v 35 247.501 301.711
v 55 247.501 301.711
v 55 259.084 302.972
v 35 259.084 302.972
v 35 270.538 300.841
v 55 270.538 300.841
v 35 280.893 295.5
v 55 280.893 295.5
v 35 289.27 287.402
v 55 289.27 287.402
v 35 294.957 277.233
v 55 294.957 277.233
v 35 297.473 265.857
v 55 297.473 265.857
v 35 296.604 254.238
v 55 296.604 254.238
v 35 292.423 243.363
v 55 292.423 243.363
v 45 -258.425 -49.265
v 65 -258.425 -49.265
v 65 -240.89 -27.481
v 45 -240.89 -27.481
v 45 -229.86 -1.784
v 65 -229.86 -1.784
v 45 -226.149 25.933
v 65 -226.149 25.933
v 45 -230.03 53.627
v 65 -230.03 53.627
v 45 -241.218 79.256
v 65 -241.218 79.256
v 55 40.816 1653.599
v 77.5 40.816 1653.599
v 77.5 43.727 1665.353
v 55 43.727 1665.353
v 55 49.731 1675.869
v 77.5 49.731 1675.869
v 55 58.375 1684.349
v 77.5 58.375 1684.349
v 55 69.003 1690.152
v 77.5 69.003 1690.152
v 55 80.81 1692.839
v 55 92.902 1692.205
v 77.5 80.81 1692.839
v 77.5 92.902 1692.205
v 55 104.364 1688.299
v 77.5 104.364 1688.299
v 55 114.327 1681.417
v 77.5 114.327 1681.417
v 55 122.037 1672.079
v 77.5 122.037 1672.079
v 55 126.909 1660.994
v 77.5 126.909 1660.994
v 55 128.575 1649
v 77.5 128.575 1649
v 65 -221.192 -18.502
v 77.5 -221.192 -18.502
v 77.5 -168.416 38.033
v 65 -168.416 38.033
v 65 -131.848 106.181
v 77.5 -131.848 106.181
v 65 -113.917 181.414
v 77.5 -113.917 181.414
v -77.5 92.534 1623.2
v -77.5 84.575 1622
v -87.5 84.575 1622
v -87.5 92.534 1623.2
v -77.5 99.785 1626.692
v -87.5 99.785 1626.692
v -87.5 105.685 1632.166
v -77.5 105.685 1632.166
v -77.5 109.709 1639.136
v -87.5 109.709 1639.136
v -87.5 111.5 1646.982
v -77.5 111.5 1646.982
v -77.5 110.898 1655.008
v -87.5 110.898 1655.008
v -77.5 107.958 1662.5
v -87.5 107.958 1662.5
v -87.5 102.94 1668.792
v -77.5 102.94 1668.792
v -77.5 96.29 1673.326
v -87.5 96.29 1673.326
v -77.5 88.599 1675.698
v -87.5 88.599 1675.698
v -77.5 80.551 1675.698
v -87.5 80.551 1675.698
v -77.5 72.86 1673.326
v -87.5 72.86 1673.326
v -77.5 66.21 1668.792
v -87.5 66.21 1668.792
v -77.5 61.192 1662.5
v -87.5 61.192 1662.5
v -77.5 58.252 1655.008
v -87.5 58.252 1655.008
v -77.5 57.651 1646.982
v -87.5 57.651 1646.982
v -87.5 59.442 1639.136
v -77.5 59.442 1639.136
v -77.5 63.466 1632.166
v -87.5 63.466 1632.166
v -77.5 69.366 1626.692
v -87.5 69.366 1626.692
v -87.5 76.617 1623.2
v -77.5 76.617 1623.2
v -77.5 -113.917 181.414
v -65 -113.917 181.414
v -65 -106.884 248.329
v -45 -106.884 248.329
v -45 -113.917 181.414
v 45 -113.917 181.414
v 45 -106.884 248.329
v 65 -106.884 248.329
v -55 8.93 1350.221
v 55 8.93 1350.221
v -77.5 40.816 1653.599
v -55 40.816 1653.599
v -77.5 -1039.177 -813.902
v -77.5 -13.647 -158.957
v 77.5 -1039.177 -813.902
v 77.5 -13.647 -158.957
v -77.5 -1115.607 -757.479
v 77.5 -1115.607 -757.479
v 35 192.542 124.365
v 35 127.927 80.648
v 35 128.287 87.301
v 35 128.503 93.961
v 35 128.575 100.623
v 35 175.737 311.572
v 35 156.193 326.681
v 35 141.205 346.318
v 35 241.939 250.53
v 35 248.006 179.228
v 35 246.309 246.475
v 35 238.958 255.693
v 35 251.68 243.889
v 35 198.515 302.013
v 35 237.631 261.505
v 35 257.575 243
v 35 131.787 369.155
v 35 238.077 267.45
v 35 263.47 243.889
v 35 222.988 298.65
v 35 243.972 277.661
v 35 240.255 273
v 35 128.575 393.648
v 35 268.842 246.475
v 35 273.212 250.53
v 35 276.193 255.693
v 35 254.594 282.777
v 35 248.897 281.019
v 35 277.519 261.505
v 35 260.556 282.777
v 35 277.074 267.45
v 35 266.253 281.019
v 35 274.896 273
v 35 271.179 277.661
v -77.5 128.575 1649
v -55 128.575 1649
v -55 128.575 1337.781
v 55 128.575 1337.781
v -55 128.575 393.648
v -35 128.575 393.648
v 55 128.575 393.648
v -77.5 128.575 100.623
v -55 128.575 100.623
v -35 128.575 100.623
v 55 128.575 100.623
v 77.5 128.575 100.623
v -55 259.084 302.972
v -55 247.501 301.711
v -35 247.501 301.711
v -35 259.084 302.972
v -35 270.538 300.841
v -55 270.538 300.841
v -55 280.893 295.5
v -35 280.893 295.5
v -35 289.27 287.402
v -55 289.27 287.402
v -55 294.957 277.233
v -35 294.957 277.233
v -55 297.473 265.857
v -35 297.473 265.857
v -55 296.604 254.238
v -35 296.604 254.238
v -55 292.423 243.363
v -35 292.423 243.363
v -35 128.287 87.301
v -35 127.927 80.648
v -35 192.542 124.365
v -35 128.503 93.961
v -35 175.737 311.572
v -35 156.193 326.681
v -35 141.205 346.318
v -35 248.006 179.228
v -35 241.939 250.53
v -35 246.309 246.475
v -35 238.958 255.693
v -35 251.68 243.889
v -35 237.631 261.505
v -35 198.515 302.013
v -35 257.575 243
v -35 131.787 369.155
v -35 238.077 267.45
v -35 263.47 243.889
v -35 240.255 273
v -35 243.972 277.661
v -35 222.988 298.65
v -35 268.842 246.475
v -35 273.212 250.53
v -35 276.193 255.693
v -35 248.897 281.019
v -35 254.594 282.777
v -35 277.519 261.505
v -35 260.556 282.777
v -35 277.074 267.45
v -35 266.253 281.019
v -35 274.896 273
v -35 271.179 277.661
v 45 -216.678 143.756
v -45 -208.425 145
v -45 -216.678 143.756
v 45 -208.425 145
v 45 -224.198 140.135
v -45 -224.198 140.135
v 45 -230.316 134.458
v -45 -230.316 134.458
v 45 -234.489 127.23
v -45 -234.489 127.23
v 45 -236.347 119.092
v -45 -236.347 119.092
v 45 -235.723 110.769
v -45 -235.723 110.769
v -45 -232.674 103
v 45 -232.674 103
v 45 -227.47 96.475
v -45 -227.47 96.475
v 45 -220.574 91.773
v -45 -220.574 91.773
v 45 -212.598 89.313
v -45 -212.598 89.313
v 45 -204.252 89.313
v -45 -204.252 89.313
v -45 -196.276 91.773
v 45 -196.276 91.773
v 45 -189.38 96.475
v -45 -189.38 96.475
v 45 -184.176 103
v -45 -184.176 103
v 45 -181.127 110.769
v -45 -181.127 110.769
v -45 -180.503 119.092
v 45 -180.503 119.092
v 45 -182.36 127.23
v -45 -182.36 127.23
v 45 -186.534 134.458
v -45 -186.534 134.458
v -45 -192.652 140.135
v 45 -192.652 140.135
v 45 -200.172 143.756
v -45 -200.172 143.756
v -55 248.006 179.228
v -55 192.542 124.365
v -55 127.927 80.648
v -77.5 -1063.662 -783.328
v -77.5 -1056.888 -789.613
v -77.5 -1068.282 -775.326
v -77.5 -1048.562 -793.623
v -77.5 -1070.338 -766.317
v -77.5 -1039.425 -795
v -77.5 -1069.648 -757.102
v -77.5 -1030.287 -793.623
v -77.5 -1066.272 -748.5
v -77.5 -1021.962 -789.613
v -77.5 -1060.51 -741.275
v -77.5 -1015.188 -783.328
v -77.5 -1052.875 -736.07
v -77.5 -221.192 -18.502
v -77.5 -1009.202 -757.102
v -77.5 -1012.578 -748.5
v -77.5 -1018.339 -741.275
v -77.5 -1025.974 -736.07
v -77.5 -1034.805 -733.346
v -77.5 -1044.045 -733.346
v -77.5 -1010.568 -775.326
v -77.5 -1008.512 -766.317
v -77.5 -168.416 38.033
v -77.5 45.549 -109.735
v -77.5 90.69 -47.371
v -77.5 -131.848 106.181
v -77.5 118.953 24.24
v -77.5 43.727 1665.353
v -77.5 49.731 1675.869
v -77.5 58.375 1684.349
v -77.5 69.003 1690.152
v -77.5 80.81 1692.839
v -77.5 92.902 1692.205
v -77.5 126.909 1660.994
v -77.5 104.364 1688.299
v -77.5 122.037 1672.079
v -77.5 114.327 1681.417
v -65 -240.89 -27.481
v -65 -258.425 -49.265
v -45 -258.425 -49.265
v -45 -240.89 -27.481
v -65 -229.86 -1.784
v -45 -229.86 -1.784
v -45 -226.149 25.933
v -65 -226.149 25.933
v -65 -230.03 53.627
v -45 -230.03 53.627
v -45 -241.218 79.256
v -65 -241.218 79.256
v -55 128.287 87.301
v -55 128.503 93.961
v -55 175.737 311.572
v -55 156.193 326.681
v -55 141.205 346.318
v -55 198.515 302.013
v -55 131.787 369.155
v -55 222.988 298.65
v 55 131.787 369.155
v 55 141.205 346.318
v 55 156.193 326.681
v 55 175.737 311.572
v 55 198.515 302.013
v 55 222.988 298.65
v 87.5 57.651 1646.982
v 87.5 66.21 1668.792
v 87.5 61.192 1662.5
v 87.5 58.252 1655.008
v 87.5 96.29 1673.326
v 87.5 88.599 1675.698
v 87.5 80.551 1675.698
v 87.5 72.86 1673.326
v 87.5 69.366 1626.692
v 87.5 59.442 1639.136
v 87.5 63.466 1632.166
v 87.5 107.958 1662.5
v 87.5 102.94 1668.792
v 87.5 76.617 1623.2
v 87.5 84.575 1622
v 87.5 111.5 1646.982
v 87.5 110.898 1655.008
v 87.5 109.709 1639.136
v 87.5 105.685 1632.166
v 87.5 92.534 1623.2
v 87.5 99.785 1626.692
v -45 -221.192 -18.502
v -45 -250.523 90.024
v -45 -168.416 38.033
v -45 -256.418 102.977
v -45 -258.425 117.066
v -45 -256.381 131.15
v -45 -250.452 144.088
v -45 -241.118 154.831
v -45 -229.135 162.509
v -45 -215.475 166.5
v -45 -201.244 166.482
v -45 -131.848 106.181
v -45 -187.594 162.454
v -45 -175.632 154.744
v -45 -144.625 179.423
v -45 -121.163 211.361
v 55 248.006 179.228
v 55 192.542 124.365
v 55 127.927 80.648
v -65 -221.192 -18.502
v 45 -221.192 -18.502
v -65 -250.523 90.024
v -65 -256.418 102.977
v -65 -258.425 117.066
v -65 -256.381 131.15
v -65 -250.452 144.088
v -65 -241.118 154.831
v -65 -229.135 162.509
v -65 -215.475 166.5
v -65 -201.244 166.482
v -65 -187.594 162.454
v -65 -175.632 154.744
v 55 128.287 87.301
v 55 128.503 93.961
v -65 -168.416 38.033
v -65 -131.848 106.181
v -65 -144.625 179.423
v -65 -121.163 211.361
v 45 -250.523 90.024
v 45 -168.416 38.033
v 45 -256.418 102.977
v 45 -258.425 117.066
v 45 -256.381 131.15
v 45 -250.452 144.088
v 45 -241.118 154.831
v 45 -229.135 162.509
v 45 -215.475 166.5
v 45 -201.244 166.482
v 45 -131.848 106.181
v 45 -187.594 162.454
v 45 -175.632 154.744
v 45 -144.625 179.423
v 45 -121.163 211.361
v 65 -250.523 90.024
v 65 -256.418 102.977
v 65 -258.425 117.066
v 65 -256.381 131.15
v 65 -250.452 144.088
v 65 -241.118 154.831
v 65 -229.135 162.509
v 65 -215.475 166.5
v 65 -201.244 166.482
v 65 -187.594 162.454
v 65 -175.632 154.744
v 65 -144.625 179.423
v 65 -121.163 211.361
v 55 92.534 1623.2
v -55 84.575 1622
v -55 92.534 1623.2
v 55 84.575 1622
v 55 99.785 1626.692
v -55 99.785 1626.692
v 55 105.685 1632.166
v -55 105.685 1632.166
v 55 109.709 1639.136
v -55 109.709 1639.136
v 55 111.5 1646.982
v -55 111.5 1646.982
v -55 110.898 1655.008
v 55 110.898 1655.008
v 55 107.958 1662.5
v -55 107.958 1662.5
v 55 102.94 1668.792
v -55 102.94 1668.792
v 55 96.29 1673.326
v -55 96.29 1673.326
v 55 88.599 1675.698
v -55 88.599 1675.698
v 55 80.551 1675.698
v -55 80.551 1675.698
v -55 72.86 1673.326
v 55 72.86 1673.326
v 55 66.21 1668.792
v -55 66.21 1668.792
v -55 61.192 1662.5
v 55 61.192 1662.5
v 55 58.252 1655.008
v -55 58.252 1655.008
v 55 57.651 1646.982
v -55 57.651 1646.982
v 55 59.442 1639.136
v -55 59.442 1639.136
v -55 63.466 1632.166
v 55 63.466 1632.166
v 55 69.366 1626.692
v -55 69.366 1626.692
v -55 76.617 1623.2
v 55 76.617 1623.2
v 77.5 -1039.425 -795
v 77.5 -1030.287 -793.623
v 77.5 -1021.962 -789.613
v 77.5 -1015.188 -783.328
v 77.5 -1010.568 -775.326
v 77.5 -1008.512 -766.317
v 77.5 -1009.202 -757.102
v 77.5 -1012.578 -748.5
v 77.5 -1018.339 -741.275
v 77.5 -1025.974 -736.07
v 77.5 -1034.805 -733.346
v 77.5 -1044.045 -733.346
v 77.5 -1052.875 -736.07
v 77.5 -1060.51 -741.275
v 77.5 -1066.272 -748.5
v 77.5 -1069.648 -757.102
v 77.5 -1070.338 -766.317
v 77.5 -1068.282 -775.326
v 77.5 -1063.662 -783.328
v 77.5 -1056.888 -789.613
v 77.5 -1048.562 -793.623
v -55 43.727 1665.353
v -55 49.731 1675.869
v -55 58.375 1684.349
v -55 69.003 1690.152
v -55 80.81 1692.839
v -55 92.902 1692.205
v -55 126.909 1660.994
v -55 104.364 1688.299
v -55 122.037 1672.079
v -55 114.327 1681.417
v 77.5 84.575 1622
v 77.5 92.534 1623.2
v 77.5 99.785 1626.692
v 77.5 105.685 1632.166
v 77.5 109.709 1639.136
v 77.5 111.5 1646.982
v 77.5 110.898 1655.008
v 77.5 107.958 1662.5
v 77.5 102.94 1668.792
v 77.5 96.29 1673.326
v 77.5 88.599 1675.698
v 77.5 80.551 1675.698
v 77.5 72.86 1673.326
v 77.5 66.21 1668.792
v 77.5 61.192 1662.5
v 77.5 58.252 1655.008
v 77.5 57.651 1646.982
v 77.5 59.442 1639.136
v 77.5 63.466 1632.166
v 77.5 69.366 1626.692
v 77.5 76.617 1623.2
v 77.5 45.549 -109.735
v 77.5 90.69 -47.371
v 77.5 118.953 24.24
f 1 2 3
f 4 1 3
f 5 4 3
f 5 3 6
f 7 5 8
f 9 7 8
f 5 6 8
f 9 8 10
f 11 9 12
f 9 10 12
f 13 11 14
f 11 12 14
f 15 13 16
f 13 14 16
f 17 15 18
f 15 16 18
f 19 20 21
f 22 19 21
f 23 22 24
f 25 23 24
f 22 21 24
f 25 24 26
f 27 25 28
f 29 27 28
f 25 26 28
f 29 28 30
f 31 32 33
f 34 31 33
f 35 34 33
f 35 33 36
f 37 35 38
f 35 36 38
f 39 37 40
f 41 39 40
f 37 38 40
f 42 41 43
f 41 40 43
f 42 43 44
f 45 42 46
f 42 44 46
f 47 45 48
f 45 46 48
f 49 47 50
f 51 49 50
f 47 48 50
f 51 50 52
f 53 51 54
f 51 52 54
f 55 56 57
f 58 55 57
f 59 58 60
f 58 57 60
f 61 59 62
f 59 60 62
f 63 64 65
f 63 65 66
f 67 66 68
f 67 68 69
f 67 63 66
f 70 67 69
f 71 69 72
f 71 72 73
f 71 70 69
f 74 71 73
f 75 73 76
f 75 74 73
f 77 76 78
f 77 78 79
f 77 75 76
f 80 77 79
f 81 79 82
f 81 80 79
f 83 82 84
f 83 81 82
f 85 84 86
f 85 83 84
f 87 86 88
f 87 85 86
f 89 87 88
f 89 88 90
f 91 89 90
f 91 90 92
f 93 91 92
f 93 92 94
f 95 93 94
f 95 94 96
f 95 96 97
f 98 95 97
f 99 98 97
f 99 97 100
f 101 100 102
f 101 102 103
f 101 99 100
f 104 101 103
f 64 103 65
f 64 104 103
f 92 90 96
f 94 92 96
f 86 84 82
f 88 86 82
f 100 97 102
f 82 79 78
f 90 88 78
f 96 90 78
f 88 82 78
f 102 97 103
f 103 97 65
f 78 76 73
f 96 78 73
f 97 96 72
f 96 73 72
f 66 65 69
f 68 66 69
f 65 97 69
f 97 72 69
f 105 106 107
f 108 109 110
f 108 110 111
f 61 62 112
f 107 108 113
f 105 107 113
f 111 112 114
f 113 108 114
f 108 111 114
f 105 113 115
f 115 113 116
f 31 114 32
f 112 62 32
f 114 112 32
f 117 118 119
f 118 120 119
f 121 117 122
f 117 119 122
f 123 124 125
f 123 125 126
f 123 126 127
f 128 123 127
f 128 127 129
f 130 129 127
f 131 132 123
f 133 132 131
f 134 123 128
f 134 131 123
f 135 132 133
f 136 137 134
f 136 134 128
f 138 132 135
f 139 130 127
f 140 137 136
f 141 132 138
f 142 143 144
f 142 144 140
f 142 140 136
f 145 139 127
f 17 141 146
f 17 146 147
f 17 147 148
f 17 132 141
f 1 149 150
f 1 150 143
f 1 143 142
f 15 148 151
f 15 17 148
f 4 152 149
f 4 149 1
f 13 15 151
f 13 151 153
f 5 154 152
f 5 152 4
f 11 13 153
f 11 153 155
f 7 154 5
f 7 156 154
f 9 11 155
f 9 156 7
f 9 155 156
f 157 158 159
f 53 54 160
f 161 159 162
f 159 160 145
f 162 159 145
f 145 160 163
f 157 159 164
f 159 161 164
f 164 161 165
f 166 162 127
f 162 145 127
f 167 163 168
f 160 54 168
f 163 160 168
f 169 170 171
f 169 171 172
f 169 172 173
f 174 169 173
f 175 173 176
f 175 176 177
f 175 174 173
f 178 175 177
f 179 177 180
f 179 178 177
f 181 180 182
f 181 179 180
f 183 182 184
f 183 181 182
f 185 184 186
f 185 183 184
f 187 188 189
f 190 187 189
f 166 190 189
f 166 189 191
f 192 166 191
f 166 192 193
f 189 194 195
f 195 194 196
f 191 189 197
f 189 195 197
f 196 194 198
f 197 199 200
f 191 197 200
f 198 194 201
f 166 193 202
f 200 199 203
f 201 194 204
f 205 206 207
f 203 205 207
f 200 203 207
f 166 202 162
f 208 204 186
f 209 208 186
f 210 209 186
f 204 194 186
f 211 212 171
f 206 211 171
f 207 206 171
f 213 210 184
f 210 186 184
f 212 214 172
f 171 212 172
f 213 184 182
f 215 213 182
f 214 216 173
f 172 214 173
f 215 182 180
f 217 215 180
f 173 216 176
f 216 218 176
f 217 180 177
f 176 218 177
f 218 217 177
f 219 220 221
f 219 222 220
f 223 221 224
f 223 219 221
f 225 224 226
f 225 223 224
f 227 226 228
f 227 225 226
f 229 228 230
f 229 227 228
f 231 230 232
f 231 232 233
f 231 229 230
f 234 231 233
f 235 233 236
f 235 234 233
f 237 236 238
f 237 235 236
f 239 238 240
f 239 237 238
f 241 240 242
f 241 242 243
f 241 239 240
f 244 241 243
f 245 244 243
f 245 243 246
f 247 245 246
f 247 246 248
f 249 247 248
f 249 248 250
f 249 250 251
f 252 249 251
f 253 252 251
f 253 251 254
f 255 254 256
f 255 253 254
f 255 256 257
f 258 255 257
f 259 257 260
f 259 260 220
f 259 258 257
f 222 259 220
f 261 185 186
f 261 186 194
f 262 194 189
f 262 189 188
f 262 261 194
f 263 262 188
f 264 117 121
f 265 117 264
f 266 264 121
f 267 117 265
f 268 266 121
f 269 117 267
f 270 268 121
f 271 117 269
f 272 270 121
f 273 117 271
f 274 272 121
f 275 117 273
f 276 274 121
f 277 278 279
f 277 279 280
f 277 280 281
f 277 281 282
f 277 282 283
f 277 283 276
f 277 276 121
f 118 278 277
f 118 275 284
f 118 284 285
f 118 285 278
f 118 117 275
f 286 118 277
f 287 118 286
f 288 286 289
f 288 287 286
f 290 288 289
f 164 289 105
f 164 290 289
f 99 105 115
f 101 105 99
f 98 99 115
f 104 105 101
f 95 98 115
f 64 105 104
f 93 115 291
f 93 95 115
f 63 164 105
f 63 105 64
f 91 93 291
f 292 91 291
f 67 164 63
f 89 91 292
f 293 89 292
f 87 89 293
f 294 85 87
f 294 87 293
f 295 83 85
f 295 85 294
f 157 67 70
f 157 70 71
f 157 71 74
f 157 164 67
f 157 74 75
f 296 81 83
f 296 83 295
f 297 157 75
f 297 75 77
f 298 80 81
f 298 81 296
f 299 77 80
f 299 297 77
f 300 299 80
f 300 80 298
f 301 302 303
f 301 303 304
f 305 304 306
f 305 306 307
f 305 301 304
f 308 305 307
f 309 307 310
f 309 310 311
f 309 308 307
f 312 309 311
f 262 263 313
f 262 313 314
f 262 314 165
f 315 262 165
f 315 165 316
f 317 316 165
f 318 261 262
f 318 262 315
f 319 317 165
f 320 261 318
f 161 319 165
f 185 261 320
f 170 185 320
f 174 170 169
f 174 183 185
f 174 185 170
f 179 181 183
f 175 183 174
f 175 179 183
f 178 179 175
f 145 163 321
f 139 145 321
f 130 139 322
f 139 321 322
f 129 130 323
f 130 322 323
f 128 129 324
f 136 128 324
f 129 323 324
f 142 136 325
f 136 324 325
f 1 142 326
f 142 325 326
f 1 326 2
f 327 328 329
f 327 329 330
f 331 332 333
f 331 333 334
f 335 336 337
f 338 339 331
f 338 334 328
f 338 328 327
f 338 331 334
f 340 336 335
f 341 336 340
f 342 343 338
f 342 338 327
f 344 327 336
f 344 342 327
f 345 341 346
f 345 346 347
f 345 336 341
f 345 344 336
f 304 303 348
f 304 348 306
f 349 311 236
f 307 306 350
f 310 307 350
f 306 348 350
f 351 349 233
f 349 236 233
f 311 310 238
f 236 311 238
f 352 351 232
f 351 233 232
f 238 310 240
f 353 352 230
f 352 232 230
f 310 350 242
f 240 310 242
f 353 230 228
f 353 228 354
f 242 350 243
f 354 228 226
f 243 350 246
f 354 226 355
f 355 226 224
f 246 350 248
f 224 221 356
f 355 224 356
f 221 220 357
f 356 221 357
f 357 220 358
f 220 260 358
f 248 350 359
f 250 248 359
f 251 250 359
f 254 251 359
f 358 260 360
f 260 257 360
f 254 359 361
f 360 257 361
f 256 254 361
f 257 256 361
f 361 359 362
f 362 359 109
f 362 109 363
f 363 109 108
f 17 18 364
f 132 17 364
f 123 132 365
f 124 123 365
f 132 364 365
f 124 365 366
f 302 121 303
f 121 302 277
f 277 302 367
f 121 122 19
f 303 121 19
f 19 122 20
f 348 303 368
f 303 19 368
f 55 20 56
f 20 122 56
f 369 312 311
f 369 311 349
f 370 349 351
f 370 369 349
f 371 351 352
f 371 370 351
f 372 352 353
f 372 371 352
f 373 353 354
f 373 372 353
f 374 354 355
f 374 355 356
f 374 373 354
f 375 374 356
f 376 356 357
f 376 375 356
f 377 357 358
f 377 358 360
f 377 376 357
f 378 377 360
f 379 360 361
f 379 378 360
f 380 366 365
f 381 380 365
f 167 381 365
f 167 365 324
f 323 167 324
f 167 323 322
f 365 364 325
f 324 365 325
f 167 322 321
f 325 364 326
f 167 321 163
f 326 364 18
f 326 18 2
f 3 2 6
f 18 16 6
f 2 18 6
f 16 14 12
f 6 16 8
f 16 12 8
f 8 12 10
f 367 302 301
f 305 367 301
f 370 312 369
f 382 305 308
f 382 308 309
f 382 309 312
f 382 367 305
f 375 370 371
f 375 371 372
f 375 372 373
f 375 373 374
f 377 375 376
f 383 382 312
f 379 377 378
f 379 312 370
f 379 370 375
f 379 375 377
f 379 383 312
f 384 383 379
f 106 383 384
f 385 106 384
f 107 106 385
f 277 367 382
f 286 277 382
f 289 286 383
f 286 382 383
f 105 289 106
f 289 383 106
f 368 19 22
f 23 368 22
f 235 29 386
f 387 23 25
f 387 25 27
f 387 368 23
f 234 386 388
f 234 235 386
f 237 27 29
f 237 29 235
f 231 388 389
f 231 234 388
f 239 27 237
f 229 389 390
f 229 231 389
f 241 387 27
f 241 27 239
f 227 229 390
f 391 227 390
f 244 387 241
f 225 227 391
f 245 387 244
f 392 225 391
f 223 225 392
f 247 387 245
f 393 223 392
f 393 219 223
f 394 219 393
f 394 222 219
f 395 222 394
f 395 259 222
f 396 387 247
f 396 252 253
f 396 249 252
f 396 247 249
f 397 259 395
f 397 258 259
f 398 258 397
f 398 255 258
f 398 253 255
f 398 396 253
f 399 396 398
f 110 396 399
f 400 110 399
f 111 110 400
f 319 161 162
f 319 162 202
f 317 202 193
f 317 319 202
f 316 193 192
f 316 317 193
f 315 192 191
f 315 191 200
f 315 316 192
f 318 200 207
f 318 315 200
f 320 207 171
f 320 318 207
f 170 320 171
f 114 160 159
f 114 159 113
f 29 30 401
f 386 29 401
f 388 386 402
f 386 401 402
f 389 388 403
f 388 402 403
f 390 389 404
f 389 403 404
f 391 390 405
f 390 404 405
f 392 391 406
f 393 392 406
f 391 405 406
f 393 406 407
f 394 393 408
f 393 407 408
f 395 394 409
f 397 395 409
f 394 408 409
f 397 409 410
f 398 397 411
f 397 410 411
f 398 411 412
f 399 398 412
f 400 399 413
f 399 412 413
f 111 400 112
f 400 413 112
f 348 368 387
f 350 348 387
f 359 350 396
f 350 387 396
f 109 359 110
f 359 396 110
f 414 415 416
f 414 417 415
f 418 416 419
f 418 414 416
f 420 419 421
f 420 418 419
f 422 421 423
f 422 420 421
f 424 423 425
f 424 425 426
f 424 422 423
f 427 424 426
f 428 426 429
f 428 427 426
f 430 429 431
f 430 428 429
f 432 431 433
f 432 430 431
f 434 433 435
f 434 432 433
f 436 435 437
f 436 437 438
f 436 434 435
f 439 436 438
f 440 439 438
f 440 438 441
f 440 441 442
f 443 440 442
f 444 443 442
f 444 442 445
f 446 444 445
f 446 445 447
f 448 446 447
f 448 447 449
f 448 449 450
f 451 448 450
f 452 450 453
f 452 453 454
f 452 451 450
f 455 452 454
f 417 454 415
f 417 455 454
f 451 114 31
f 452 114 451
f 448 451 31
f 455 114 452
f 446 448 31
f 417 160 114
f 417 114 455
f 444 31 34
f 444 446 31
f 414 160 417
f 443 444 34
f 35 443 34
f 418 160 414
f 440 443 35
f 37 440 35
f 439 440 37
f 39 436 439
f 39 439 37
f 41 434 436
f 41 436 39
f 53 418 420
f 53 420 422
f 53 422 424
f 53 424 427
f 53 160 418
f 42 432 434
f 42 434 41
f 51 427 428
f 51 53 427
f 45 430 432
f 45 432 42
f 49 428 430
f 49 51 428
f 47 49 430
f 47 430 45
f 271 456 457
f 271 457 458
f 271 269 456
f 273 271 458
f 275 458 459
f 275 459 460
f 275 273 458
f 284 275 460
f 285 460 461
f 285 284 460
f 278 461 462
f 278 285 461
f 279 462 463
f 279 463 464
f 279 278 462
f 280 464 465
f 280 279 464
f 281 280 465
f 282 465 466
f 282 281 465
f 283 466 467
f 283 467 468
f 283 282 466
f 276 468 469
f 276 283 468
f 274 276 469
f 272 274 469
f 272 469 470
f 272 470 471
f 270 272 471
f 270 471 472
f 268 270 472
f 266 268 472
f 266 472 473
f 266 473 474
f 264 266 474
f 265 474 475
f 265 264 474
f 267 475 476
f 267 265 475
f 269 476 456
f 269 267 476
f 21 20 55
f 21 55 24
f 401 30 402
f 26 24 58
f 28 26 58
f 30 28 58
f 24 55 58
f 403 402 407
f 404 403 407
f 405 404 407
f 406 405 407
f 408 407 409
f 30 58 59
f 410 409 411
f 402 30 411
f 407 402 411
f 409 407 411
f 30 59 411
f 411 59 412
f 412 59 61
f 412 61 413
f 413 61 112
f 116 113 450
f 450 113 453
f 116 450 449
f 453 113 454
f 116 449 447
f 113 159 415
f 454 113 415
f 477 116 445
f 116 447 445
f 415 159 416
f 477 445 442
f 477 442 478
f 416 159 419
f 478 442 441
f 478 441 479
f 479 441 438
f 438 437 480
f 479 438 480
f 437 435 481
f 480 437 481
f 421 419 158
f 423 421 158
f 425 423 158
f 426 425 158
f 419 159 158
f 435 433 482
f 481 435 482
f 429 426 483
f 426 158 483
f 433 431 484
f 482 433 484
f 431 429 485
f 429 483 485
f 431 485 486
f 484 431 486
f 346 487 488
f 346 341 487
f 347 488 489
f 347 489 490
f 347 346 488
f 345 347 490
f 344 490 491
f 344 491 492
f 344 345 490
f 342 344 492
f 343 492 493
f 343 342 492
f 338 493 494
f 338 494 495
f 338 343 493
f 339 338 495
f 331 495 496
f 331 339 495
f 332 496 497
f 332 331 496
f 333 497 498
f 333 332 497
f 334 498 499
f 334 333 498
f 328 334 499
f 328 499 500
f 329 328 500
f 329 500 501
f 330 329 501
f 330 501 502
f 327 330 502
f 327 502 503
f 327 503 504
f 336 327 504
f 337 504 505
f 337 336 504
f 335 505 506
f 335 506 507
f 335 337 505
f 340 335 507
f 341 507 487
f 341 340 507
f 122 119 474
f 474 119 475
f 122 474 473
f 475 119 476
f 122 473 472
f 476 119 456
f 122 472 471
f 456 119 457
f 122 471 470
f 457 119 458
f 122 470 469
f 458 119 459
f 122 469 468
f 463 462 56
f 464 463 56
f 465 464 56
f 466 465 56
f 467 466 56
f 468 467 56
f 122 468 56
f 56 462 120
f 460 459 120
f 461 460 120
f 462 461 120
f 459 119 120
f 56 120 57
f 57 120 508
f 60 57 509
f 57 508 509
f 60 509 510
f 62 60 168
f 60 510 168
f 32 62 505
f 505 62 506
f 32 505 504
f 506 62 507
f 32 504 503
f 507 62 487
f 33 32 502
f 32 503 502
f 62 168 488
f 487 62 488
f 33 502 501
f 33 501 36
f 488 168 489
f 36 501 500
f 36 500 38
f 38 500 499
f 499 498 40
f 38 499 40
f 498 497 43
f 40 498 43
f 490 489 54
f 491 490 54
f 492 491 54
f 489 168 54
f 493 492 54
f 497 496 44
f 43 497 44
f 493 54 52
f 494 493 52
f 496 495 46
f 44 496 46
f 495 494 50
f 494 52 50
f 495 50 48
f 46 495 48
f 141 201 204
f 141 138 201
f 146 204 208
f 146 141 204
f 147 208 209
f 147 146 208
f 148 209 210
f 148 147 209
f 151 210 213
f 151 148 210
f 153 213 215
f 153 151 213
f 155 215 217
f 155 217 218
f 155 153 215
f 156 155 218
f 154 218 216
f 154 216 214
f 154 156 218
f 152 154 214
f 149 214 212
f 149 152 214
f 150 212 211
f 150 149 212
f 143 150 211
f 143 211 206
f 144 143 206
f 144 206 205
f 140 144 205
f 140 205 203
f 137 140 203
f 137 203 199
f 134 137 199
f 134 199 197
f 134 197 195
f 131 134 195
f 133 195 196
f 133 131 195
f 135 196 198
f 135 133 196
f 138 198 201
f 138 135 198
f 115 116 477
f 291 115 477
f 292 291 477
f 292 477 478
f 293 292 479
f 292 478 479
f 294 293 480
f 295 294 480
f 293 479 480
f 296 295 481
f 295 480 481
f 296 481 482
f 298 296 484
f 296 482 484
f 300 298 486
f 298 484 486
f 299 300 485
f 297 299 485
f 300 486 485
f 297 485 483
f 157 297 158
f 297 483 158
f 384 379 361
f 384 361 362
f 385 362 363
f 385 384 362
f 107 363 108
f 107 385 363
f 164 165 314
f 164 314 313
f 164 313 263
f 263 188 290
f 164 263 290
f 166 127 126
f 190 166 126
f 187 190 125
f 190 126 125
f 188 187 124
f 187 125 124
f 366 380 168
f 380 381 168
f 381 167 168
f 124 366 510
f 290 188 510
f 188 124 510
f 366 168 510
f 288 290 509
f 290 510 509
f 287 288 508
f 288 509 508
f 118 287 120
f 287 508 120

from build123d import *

# Parameters (mm, degrees)
SKETCH1_R           = 31
BOSS_EXTRUDE1_DEPTH = 77.5
CUT_EXTRUDE1_DEPTH  = 55
SKETCH3_R           = 27
BOSS_EXTRUDE2_DEPTH = 87.5
BOSS_EXTRUDE3_START = 55
SKETCH4_R           = 20
BOSS_EXTRUDE3_DEPTH = 20
BOSS_EXTRUDE4_START = 65
SKETCH5_R           = 28
BOSS_EXTRUDE4_DEPTH = 20
SKETCH6_R           = 20
BOSS_EXTRUDE5_DEPTH = 55
SKETCH7_R           = 28
BOSS_EXTRUDE6_DEPTH = 65


with BuildPart() as part:
    # Sketch1 → Boss-Extrude1 (new, symmetric)
    with BuildSketch(Plane(origin=(0, 0, 0), x_dir=(0, 0, -1), z_dir=(1, 0, 0))):
        with BuildLine():
            Line((-1649, 128.575159042), (-100.623018779, 128.575159042))
            ThreePointArc((-100.623018779, 128.575159042), (47.370818148, 90.689624097), (158.95669611, -13.646761532))
            Line((158.95669611, -13.646761532), (813.901849353, -1039.177258296))
            Line((813.901849353, -1039.177258296), (757.478946429, -1115.606676884))
            Line((757.478946429, -1115.606676884), (18.502038696, -221.191618301))
            ThreePointArc((18.502038696, -221.191618301), (-70.923814933, -147.926895035), (-181.413689889, -113.916742069))
            Line((-181.413689889, -113.916742069), (-1653.599252384, 40.816195646))
            ThreePointArc((-1653.599252384, 40.816195646), (-1692.939699529, 86.877941117), (-1649, 128.575159042))
        make_face()
        with Locations((764, -1039.424840958)):
            Circle(SKETCH1_R, mode=Mode.SUBTRACT)
    extrude(amount=BOSS_EXTRUDE1_DEPTH, both=True)

    # Sketch2 → Cut-Extrude1 (cut, symmetric)
    with BuildSketch(Plane(origin=(0, 0, 0), x_dir=(0, 0, -1), z_dir=(1, 0, 0))):
        with BuildLine():
            Line((-1337.780808047, 128.575159042), (-1350.221049377, 8.929861623))
            Line((-1350.221049377, 8.929861623), (-1653.599252384, 40.816195646))
            ThreePointArc((-1653.599252384, 40.816195646), (-1692.939699529, 86.877941117), (-1649, 128.575159042))
            Line((-1649, 128.575159042), (-1337.780808047, 128.575159042))
        make_face()
    extrude(amount=CUT_EXTRUDE1_DEPTH, both=True, mode=Mode.SUBTRACT)

    # Sketch3 → Boss-Extrude2 (add, symmetric)
    with BuildSketch(Plane(origin=(0, 0, 0), x_dir=(0, 0, -1), z_dir=(1, 0, 0))):
        with Locations((-1649, 84.575159042)):
            Circle(SKETCH3_R)
    extrude(amount=BOSS_EXTRUDE2_DEPTH, both=True)

    # Sketch4 → Boss-Extrude3 (add)
    with BuildSketch(Plane(origin=(0, 0, 0), x_dir=(0, 0, -1), z_dir=(1, 0, 0)).offset(BOSS_EXTRUDE3_START)):
        with BuildLine():
            Line((-100.623018779, 128.575159042), (-393.648383075, 128.575159042))
            ThreePointArc((-393.648383075, 128.575159042), (-318.488676572, 165.471643499), (-301.710632022, 247.501084968))
            ThreePointArc((-301.710632022, 247.501084968), (-287.401961188, 289.269705737), (-243.363225881, 292.423359888))
            ThreePointArc((-243.363225881, 292.423359888), (-150.511724148, 221.544648068), (-80.648383075, 127.926771904))
            ThreePointArc((-80.648383075, 127.926771904), (-90.630440565, 128.41301958), (-100.623018779, 128.575159042))
        make_face()
        with Locations((-263, 257.575159042)):
            Circle(SKETCH4_R, mode=Mode.SUBTRACT)
    extrude(amount=-BOSS_EXTRUDE3_DEPTH)

    # Mirror1: part across plane


with BuildPart() as part_1:
    add(part.part)
    add(part.part.mirror(Plane(origin=(0, 0, 0), x_dir=(0, 0, 1), z_dir=(1, 0, 0))))

    # Sketch5 → Boss-Extrude4 (add)
    with BuildSketch(Plane(origin=(0, 0, 0), x_dir=(0, 0, -1), z_dir=(1, 0, 0)).offset(BOSS_EXTRUDE4_START)):
        with BuildLine():
            Line((18.502038696, -221.191618301), (49.264592926, -258.424840958))
            ThreePointArc((49.264592926, -258.424840958), (-11.948195085, -227.059459611), (-79.255928514, -241.217905281))
            ThreePointArc((-79.255928514, -241.217905281), (-149.793064323, -246.168912443), (-154.744071486, -175.631776635))
            ThreePointArc((-154.744071486, -175.631776635), (-194.614118429, -131.834300288), (-248.329147356, -106.883644085))
            Line((-248.329147356, -106.883644085), (-181.413689889, -113.916742069))
            ThreePointArc((-181.413689889, -113.916742069), (-70.923814933, -147.926895035), (18.502038696, -221.191618301))
        make_face()
        with Locations((-117, -208.424840958)):
            Circle(SKETCH5_R, mode=Mode.SUBTRACT)
    extrude(amount=-BOSS_EXTRUDE4_DEPTH)

    # Mirror2: part across plane


with BuildPart() as part_2:
    add(part_1.part)
    add(part_1.part.mirror(Plane(origin=(0, 0, 0), x_dir=(0, 0, 1), z_dir=(1, 0, 0))))

    # Sketch6 → Boss-Extrude5 (add, symmetric)
    with BuildSketch(Plane(origin=(0, 0, 0), x_dir=(0, 0, -1), z_dir=(1, 0, 0))):
        with Locations((-263, 257.575159042)):
            Circle(SKETCH6_R)
    extrude(amount=BOSS_EXTRUDE5_DEPTH, both=True)

    # Sketch7 → Boss-Extrude6 (add, symmetric)
    with BuildSketch(Plane(origin=(0, 0, 0), x_dir=(0, 0, -1), z_dir=(1, 0, 0))):
        with Locations(Location((-117, -208.424840958, 0), (0, 0, 180))):
            Circle(SKETCH7_R)
    extrude(amount=BOSS_EXTRUDE6_DEPTH, both=True)


solid = part_2.part
